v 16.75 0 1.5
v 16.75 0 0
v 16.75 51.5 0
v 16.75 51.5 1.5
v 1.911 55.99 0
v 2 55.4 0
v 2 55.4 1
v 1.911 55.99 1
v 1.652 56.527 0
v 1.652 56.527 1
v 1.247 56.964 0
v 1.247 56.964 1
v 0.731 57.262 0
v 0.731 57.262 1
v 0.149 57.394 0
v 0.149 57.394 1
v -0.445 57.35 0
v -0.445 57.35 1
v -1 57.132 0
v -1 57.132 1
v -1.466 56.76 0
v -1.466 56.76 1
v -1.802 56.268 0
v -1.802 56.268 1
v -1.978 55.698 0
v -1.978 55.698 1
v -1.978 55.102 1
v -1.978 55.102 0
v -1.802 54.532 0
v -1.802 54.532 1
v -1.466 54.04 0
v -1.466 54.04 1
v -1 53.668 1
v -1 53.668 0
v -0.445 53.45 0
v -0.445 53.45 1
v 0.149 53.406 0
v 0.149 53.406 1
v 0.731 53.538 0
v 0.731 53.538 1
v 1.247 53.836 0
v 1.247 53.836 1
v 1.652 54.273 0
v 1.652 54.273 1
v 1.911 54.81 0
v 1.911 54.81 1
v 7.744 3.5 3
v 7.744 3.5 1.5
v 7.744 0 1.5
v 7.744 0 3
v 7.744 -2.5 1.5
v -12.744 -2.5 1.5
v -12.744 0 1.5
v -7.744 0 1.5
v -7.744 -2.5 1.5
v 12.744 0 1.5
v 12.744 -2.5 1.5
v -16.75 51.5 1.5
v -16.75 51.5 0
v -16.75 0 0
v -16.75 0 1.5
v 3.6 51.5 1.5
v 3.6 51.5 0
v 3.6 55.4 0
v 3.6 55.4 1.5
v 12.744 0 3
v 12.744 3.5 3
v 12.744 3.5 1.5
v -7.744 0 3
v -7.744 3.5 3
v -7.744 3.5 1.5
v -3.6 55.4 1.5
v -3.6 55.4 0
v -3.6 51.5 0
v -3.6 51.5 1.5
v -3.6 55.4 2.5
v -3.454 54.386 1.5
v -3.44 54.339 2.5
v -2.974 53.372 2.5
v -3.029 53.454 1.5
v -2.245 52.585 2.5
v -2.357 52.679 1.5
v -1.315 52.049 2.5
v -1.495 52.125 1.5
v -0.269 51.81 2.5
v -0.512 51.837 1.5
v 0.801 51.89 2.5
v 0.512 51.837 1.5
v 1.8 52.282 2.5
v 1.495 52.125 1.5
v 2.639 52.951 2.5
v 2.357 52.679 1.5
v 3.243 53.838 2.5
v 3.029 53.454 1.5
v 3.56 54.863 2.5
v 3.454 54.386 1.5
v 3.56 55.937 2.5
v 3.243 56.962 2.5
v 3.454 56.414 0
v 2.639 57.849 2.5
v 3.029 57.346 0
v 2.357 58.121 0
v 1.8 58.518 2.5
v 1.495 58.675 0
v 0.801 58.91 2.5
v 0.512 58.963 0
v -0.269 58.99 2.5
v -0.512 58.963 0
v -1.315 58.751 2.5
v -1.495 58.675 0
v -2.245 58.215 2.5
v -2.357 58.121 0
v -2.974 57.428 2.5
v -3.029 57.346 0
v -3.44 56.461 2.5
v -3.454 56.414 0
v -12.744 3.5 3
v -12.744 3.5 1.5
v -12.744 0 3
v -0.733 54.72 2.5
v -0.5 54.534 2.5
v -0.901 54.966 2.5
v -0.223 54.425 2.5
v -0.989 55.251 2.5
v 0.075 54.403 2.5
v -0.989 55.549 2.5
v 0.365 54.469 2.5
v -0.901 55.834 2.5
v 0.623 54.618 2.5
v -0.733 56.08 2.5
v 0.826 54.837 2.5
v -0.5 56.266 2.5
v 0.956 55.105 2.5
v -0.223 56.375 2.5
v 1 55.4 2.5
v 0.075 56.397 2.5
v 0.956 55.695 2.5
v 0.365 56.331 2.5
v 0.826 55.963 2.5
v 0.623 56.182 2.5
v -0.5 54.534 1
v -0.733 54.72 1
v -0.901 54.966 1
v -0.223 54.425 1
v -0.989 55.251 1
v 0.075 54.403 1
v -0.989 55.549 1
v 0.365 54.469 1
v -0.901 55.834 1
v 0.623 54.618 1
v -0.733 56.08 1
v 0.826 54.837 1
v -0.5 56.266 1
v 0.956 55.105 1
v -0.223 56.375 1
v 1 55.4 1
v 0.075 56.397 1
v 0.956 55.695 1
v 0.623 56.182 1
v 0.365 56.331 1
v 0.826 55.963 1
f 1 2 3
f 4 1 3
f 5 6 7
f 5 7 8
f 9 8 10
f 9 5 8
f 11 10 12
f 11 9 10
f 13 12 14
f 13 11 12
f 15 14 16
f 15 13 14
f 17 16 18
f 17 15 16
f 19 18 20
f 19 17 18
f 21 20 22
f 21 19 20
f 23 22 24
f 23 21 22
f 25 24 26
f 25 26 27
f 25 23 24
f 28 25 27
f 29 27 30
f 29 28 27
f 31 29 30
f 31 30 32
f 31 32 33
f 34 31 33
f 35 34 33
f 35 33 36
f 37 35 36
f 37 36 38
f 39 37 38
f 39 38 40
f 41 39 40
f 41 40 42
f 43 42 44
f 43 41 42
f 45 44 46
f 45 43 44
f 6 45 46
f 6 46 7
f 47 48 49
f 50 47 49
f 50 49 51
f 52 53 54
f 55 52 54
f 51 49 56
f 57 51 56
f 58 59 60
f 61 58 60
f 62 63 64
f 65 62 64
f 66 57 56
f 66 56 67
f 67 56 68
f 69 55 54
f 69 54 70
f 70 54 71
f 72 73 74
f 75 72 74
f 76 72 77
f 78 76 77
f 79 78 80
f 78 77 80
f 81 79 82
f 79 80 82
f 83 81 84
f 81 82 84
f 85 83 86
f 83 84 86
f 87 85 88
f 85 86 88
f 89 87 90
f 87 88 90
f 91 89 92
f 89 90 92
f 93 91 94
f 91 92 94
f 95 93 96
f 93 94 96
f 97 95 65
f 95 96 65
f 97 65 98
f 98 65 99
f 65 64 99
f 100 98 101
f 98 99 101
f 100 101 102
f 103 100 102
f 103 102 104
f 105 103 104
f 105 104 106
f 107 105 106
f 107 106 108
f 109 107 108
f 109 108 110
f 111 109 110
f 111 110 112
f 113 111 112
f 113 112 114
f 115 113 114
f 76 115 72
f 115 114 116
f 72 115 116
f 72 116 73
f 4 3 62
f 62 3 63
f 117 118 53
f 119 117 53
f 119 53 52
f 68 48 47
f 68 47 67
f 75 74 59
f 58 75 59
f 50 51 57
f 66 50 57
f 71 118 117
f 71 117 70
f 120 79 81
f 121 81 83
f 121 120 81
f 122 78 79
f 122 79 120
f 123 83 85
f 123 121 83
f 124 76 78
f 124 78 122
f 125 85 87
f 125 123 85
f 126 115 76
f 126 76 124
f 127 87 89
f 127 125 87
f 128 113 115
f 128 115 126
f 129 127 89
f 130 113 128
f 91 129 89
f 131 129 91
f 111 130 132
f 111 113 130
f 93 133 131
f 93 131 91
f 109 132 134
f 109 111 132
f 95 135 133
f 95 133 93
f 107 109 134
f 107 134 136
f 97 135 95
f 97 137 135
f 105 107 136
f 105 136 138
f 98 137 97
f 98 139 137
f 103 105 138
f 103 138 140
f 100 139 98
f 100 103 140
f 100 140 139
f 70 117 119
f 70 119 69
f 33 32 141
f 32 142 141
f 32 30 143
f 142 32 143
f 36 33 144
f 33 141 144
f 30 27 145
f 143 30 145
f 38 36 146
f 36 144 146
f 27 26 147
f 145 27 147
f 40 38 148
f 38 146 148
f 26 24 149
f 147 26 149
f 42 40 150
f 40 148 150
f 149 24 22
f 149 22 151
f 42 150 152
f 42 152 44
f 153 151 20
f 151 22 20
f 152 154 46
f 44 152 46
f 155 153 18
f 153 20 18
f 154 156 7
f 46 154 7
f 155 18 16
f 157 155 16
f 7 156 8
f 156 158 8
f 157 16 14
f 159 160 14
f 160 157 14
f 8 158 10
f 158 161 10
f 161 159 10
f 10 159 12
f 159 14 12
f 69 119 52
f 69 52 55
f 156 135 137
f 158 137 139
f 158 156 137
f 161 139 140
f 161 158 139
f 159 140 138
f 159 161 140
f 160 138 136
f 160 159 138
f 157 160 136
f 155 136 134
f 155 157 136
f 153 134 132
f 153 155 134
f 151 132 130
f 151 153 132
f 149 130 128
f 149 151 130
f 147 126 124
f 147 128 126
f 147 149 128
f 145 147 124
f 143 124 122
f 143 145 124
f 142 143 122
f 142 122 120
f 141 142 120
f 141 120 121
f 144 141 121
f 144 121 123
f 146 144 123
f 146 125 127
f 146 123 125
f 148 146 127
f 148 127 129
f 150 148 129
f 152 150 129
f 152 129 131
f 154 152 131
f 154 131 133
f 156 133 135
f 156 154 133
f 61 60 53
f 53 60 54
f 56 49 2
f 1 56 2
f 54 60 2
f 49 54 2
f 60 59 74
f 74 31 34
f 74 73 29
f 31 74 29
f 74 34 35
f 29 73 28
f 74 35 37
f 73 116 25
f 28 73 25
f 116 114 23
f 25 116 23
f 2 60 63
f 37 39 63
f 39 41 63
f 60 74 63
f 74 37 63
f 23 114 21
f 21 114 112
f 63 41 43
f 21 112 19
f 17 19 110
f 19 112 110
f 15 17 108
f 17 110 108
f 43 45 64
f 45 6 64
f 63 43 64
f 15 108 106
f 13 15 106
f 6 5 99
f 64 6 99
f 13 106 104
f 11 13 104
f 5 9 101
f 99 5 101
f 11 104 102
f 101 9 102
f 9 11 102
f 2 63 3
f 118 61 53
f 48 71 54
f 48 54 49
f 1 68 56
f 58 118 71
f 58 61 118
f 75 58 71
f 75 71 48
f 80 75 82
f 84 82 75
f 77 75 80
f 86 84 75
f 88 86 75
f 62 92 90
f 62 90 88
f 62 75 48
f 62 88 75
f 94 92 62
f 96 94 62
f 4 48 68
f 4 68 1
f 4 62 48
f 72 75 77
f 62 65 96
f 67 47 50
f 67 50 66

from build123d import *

# Parameters (mm, degrees)
F0_R     = 2
F0_R_2   = 1
F1_DEPTH = 1.5
F2_DEPTH = 2.5
F3_W     = 5
F3_H     = 2.5
F3_H_2   = 3.5
F4_DEPTH = 1.5
F5_SIZE2 = 2.49999
F5_SIZE  = 1.49999
F6_SIZE2 = 1.49999
F6_SIZE  = 2.49999
F7_DEPTH = 25
F8_DEPTH = 1


# Not quite as in the source:
# - a fillet or chamfer is up to 0.001 mm smaller than in the source, because OpenCascade refuses the exact size
# - a feature names something its author has since deleted; it is built from what else it names


with BuildPart() as f1:
    # F0 (on Top) → F1 (new body)
    with BuildSketch(Plane.XY):
        Polygon((-16.75, 0), (0, 0), (16.75, 0), (16.75, 51.5), (3.6, 51.5), (0, 51.5), (-3.6, 51.5), (-16.75, 51.5), align=None)
        with BuildLine():
            ThreePointArc((3.6, 55.4), (0, 59), (-3.6, 55.4))
            ThreePointArc((-3.6, 55.4), (0, 51.8), (3.6, 55.4))
        make_face()
        with Locations((0, 55.4)):
            Circle(F0_R, mode=Mode.SUBTRACT)
        with Locations((0, 55.4)):
            Circle(F0_R)
        with Locations((0, 55.4)):
            Circle(F0_R_2, mode=Mode.SUBTRACT)
        with BuildLine():
            Line((-3.6, 55.4), (-3.6, 51.5))
            Line((-3.6, 51.5), (0, 51.5))
            Line((0, 51.5), (3.6, 51.5))
            Line((3.6, 51.5), (3.6, 55.4))
            ThreePointArc((3.6, 55.4), (0, 51.8), (-3.6, 55.4))
        make_face()
        with Locations((0, 55.4)):
            Circle(F0_R_2)
    extrude(amount=F1_DEPTH)

    # F0 (on Top) → F2 (join)
    with BuildSketch(Plane.XY):
        with BuildLine():
            ThreePointArc((3.6, 55.4), (0, 59), (-3.6, 55.4))
            ThreePointArc((-3.6, 55.4), (0, 51.8), (3.6, 55.4))
        make_face()
        with Locations((0, 55.4)):
            Circle(F0_R, mode=Mode.SUBTRACT)
        with Locations((0, 55.4)):
            Circle(F0_R)
        with Locations((0, 55.4)):
            Circle(F0_R_2, mode=Mode.SUBTRACT)
        with Locations((0, 55.4)):
            Circle(F0_R_2)
    extrude(amount=F2_DEPTH)

    # F3 (on face) → F4 (join)
    with BuildSketch(Plane.XY.offset(1.5)):
        with Locations((-10.2441851608, -1.25)):
            Rectangle(F3_W, F3_H)
        with Locations((-10.2441851608, 1.75)):
            Rectangle(F3_W, F3_H_2)
        with Locations((10.2441851608, -1.25)):
            Rectangle(F3_W, F3_H)
        with Locations((10.2441851608, 1.75)):
            Rectangle(F3_W, F3_H_2)
    extrude(amount=F4_DEPTH)

    # F5 (size 1.5 and 2.5 in the source; OpenCascade refuses exactly that, so slightly less here)
    f5_edges = [f1.edges().sort_by_distance(p)[0] for p in [
        (-10.244185, -2.5, 3),
    ]]
    f5_side = f1.faces().sort_by_distance((-10.244185, -2.5, 2.25))[0]
    chamfer(f5_edges, length=F5_SIZE, length2=F5_SIZE2, reference=f5_side)

    # F6 (size 2.5 and 1.5 in the source; OpenCascade refuses exactly that, so slightly less here)
    f6_edges = [f1.edges().sort_by_distance(p)[0] for p in [
        (10.244185, -2.5, 3),
    ]]
    f6_side = f1.faces().sort_by_distance((10.244185, 0.5, 3))[0]
    chamfer(f6_edges, length=F6_SIZE, length2=F6_SIZE2, reference=f6_side)

    # F0 (on Top) → F7 (cut)
    with BuildSketch(Plane.XY):
        with Locations((0, 55.4)):
            Circle(F0_R_2)
    extrude(amount=F7_DEPTH, mode=Mode.SUBTRACT)

    # F0 (on Top) → F8 (cut)
    with BuildSketch(Plane.XY):
        with Locations((0, 55.4)):
            Circle(F0_R)
        with Locations((0, 55.4)):
            Circle(F0_R_2, mode=Mode.SUBTRACT)
    extrude(amount=F8_DEPTH, mode=Mode.SUBTRACT)


solid = f1.part
